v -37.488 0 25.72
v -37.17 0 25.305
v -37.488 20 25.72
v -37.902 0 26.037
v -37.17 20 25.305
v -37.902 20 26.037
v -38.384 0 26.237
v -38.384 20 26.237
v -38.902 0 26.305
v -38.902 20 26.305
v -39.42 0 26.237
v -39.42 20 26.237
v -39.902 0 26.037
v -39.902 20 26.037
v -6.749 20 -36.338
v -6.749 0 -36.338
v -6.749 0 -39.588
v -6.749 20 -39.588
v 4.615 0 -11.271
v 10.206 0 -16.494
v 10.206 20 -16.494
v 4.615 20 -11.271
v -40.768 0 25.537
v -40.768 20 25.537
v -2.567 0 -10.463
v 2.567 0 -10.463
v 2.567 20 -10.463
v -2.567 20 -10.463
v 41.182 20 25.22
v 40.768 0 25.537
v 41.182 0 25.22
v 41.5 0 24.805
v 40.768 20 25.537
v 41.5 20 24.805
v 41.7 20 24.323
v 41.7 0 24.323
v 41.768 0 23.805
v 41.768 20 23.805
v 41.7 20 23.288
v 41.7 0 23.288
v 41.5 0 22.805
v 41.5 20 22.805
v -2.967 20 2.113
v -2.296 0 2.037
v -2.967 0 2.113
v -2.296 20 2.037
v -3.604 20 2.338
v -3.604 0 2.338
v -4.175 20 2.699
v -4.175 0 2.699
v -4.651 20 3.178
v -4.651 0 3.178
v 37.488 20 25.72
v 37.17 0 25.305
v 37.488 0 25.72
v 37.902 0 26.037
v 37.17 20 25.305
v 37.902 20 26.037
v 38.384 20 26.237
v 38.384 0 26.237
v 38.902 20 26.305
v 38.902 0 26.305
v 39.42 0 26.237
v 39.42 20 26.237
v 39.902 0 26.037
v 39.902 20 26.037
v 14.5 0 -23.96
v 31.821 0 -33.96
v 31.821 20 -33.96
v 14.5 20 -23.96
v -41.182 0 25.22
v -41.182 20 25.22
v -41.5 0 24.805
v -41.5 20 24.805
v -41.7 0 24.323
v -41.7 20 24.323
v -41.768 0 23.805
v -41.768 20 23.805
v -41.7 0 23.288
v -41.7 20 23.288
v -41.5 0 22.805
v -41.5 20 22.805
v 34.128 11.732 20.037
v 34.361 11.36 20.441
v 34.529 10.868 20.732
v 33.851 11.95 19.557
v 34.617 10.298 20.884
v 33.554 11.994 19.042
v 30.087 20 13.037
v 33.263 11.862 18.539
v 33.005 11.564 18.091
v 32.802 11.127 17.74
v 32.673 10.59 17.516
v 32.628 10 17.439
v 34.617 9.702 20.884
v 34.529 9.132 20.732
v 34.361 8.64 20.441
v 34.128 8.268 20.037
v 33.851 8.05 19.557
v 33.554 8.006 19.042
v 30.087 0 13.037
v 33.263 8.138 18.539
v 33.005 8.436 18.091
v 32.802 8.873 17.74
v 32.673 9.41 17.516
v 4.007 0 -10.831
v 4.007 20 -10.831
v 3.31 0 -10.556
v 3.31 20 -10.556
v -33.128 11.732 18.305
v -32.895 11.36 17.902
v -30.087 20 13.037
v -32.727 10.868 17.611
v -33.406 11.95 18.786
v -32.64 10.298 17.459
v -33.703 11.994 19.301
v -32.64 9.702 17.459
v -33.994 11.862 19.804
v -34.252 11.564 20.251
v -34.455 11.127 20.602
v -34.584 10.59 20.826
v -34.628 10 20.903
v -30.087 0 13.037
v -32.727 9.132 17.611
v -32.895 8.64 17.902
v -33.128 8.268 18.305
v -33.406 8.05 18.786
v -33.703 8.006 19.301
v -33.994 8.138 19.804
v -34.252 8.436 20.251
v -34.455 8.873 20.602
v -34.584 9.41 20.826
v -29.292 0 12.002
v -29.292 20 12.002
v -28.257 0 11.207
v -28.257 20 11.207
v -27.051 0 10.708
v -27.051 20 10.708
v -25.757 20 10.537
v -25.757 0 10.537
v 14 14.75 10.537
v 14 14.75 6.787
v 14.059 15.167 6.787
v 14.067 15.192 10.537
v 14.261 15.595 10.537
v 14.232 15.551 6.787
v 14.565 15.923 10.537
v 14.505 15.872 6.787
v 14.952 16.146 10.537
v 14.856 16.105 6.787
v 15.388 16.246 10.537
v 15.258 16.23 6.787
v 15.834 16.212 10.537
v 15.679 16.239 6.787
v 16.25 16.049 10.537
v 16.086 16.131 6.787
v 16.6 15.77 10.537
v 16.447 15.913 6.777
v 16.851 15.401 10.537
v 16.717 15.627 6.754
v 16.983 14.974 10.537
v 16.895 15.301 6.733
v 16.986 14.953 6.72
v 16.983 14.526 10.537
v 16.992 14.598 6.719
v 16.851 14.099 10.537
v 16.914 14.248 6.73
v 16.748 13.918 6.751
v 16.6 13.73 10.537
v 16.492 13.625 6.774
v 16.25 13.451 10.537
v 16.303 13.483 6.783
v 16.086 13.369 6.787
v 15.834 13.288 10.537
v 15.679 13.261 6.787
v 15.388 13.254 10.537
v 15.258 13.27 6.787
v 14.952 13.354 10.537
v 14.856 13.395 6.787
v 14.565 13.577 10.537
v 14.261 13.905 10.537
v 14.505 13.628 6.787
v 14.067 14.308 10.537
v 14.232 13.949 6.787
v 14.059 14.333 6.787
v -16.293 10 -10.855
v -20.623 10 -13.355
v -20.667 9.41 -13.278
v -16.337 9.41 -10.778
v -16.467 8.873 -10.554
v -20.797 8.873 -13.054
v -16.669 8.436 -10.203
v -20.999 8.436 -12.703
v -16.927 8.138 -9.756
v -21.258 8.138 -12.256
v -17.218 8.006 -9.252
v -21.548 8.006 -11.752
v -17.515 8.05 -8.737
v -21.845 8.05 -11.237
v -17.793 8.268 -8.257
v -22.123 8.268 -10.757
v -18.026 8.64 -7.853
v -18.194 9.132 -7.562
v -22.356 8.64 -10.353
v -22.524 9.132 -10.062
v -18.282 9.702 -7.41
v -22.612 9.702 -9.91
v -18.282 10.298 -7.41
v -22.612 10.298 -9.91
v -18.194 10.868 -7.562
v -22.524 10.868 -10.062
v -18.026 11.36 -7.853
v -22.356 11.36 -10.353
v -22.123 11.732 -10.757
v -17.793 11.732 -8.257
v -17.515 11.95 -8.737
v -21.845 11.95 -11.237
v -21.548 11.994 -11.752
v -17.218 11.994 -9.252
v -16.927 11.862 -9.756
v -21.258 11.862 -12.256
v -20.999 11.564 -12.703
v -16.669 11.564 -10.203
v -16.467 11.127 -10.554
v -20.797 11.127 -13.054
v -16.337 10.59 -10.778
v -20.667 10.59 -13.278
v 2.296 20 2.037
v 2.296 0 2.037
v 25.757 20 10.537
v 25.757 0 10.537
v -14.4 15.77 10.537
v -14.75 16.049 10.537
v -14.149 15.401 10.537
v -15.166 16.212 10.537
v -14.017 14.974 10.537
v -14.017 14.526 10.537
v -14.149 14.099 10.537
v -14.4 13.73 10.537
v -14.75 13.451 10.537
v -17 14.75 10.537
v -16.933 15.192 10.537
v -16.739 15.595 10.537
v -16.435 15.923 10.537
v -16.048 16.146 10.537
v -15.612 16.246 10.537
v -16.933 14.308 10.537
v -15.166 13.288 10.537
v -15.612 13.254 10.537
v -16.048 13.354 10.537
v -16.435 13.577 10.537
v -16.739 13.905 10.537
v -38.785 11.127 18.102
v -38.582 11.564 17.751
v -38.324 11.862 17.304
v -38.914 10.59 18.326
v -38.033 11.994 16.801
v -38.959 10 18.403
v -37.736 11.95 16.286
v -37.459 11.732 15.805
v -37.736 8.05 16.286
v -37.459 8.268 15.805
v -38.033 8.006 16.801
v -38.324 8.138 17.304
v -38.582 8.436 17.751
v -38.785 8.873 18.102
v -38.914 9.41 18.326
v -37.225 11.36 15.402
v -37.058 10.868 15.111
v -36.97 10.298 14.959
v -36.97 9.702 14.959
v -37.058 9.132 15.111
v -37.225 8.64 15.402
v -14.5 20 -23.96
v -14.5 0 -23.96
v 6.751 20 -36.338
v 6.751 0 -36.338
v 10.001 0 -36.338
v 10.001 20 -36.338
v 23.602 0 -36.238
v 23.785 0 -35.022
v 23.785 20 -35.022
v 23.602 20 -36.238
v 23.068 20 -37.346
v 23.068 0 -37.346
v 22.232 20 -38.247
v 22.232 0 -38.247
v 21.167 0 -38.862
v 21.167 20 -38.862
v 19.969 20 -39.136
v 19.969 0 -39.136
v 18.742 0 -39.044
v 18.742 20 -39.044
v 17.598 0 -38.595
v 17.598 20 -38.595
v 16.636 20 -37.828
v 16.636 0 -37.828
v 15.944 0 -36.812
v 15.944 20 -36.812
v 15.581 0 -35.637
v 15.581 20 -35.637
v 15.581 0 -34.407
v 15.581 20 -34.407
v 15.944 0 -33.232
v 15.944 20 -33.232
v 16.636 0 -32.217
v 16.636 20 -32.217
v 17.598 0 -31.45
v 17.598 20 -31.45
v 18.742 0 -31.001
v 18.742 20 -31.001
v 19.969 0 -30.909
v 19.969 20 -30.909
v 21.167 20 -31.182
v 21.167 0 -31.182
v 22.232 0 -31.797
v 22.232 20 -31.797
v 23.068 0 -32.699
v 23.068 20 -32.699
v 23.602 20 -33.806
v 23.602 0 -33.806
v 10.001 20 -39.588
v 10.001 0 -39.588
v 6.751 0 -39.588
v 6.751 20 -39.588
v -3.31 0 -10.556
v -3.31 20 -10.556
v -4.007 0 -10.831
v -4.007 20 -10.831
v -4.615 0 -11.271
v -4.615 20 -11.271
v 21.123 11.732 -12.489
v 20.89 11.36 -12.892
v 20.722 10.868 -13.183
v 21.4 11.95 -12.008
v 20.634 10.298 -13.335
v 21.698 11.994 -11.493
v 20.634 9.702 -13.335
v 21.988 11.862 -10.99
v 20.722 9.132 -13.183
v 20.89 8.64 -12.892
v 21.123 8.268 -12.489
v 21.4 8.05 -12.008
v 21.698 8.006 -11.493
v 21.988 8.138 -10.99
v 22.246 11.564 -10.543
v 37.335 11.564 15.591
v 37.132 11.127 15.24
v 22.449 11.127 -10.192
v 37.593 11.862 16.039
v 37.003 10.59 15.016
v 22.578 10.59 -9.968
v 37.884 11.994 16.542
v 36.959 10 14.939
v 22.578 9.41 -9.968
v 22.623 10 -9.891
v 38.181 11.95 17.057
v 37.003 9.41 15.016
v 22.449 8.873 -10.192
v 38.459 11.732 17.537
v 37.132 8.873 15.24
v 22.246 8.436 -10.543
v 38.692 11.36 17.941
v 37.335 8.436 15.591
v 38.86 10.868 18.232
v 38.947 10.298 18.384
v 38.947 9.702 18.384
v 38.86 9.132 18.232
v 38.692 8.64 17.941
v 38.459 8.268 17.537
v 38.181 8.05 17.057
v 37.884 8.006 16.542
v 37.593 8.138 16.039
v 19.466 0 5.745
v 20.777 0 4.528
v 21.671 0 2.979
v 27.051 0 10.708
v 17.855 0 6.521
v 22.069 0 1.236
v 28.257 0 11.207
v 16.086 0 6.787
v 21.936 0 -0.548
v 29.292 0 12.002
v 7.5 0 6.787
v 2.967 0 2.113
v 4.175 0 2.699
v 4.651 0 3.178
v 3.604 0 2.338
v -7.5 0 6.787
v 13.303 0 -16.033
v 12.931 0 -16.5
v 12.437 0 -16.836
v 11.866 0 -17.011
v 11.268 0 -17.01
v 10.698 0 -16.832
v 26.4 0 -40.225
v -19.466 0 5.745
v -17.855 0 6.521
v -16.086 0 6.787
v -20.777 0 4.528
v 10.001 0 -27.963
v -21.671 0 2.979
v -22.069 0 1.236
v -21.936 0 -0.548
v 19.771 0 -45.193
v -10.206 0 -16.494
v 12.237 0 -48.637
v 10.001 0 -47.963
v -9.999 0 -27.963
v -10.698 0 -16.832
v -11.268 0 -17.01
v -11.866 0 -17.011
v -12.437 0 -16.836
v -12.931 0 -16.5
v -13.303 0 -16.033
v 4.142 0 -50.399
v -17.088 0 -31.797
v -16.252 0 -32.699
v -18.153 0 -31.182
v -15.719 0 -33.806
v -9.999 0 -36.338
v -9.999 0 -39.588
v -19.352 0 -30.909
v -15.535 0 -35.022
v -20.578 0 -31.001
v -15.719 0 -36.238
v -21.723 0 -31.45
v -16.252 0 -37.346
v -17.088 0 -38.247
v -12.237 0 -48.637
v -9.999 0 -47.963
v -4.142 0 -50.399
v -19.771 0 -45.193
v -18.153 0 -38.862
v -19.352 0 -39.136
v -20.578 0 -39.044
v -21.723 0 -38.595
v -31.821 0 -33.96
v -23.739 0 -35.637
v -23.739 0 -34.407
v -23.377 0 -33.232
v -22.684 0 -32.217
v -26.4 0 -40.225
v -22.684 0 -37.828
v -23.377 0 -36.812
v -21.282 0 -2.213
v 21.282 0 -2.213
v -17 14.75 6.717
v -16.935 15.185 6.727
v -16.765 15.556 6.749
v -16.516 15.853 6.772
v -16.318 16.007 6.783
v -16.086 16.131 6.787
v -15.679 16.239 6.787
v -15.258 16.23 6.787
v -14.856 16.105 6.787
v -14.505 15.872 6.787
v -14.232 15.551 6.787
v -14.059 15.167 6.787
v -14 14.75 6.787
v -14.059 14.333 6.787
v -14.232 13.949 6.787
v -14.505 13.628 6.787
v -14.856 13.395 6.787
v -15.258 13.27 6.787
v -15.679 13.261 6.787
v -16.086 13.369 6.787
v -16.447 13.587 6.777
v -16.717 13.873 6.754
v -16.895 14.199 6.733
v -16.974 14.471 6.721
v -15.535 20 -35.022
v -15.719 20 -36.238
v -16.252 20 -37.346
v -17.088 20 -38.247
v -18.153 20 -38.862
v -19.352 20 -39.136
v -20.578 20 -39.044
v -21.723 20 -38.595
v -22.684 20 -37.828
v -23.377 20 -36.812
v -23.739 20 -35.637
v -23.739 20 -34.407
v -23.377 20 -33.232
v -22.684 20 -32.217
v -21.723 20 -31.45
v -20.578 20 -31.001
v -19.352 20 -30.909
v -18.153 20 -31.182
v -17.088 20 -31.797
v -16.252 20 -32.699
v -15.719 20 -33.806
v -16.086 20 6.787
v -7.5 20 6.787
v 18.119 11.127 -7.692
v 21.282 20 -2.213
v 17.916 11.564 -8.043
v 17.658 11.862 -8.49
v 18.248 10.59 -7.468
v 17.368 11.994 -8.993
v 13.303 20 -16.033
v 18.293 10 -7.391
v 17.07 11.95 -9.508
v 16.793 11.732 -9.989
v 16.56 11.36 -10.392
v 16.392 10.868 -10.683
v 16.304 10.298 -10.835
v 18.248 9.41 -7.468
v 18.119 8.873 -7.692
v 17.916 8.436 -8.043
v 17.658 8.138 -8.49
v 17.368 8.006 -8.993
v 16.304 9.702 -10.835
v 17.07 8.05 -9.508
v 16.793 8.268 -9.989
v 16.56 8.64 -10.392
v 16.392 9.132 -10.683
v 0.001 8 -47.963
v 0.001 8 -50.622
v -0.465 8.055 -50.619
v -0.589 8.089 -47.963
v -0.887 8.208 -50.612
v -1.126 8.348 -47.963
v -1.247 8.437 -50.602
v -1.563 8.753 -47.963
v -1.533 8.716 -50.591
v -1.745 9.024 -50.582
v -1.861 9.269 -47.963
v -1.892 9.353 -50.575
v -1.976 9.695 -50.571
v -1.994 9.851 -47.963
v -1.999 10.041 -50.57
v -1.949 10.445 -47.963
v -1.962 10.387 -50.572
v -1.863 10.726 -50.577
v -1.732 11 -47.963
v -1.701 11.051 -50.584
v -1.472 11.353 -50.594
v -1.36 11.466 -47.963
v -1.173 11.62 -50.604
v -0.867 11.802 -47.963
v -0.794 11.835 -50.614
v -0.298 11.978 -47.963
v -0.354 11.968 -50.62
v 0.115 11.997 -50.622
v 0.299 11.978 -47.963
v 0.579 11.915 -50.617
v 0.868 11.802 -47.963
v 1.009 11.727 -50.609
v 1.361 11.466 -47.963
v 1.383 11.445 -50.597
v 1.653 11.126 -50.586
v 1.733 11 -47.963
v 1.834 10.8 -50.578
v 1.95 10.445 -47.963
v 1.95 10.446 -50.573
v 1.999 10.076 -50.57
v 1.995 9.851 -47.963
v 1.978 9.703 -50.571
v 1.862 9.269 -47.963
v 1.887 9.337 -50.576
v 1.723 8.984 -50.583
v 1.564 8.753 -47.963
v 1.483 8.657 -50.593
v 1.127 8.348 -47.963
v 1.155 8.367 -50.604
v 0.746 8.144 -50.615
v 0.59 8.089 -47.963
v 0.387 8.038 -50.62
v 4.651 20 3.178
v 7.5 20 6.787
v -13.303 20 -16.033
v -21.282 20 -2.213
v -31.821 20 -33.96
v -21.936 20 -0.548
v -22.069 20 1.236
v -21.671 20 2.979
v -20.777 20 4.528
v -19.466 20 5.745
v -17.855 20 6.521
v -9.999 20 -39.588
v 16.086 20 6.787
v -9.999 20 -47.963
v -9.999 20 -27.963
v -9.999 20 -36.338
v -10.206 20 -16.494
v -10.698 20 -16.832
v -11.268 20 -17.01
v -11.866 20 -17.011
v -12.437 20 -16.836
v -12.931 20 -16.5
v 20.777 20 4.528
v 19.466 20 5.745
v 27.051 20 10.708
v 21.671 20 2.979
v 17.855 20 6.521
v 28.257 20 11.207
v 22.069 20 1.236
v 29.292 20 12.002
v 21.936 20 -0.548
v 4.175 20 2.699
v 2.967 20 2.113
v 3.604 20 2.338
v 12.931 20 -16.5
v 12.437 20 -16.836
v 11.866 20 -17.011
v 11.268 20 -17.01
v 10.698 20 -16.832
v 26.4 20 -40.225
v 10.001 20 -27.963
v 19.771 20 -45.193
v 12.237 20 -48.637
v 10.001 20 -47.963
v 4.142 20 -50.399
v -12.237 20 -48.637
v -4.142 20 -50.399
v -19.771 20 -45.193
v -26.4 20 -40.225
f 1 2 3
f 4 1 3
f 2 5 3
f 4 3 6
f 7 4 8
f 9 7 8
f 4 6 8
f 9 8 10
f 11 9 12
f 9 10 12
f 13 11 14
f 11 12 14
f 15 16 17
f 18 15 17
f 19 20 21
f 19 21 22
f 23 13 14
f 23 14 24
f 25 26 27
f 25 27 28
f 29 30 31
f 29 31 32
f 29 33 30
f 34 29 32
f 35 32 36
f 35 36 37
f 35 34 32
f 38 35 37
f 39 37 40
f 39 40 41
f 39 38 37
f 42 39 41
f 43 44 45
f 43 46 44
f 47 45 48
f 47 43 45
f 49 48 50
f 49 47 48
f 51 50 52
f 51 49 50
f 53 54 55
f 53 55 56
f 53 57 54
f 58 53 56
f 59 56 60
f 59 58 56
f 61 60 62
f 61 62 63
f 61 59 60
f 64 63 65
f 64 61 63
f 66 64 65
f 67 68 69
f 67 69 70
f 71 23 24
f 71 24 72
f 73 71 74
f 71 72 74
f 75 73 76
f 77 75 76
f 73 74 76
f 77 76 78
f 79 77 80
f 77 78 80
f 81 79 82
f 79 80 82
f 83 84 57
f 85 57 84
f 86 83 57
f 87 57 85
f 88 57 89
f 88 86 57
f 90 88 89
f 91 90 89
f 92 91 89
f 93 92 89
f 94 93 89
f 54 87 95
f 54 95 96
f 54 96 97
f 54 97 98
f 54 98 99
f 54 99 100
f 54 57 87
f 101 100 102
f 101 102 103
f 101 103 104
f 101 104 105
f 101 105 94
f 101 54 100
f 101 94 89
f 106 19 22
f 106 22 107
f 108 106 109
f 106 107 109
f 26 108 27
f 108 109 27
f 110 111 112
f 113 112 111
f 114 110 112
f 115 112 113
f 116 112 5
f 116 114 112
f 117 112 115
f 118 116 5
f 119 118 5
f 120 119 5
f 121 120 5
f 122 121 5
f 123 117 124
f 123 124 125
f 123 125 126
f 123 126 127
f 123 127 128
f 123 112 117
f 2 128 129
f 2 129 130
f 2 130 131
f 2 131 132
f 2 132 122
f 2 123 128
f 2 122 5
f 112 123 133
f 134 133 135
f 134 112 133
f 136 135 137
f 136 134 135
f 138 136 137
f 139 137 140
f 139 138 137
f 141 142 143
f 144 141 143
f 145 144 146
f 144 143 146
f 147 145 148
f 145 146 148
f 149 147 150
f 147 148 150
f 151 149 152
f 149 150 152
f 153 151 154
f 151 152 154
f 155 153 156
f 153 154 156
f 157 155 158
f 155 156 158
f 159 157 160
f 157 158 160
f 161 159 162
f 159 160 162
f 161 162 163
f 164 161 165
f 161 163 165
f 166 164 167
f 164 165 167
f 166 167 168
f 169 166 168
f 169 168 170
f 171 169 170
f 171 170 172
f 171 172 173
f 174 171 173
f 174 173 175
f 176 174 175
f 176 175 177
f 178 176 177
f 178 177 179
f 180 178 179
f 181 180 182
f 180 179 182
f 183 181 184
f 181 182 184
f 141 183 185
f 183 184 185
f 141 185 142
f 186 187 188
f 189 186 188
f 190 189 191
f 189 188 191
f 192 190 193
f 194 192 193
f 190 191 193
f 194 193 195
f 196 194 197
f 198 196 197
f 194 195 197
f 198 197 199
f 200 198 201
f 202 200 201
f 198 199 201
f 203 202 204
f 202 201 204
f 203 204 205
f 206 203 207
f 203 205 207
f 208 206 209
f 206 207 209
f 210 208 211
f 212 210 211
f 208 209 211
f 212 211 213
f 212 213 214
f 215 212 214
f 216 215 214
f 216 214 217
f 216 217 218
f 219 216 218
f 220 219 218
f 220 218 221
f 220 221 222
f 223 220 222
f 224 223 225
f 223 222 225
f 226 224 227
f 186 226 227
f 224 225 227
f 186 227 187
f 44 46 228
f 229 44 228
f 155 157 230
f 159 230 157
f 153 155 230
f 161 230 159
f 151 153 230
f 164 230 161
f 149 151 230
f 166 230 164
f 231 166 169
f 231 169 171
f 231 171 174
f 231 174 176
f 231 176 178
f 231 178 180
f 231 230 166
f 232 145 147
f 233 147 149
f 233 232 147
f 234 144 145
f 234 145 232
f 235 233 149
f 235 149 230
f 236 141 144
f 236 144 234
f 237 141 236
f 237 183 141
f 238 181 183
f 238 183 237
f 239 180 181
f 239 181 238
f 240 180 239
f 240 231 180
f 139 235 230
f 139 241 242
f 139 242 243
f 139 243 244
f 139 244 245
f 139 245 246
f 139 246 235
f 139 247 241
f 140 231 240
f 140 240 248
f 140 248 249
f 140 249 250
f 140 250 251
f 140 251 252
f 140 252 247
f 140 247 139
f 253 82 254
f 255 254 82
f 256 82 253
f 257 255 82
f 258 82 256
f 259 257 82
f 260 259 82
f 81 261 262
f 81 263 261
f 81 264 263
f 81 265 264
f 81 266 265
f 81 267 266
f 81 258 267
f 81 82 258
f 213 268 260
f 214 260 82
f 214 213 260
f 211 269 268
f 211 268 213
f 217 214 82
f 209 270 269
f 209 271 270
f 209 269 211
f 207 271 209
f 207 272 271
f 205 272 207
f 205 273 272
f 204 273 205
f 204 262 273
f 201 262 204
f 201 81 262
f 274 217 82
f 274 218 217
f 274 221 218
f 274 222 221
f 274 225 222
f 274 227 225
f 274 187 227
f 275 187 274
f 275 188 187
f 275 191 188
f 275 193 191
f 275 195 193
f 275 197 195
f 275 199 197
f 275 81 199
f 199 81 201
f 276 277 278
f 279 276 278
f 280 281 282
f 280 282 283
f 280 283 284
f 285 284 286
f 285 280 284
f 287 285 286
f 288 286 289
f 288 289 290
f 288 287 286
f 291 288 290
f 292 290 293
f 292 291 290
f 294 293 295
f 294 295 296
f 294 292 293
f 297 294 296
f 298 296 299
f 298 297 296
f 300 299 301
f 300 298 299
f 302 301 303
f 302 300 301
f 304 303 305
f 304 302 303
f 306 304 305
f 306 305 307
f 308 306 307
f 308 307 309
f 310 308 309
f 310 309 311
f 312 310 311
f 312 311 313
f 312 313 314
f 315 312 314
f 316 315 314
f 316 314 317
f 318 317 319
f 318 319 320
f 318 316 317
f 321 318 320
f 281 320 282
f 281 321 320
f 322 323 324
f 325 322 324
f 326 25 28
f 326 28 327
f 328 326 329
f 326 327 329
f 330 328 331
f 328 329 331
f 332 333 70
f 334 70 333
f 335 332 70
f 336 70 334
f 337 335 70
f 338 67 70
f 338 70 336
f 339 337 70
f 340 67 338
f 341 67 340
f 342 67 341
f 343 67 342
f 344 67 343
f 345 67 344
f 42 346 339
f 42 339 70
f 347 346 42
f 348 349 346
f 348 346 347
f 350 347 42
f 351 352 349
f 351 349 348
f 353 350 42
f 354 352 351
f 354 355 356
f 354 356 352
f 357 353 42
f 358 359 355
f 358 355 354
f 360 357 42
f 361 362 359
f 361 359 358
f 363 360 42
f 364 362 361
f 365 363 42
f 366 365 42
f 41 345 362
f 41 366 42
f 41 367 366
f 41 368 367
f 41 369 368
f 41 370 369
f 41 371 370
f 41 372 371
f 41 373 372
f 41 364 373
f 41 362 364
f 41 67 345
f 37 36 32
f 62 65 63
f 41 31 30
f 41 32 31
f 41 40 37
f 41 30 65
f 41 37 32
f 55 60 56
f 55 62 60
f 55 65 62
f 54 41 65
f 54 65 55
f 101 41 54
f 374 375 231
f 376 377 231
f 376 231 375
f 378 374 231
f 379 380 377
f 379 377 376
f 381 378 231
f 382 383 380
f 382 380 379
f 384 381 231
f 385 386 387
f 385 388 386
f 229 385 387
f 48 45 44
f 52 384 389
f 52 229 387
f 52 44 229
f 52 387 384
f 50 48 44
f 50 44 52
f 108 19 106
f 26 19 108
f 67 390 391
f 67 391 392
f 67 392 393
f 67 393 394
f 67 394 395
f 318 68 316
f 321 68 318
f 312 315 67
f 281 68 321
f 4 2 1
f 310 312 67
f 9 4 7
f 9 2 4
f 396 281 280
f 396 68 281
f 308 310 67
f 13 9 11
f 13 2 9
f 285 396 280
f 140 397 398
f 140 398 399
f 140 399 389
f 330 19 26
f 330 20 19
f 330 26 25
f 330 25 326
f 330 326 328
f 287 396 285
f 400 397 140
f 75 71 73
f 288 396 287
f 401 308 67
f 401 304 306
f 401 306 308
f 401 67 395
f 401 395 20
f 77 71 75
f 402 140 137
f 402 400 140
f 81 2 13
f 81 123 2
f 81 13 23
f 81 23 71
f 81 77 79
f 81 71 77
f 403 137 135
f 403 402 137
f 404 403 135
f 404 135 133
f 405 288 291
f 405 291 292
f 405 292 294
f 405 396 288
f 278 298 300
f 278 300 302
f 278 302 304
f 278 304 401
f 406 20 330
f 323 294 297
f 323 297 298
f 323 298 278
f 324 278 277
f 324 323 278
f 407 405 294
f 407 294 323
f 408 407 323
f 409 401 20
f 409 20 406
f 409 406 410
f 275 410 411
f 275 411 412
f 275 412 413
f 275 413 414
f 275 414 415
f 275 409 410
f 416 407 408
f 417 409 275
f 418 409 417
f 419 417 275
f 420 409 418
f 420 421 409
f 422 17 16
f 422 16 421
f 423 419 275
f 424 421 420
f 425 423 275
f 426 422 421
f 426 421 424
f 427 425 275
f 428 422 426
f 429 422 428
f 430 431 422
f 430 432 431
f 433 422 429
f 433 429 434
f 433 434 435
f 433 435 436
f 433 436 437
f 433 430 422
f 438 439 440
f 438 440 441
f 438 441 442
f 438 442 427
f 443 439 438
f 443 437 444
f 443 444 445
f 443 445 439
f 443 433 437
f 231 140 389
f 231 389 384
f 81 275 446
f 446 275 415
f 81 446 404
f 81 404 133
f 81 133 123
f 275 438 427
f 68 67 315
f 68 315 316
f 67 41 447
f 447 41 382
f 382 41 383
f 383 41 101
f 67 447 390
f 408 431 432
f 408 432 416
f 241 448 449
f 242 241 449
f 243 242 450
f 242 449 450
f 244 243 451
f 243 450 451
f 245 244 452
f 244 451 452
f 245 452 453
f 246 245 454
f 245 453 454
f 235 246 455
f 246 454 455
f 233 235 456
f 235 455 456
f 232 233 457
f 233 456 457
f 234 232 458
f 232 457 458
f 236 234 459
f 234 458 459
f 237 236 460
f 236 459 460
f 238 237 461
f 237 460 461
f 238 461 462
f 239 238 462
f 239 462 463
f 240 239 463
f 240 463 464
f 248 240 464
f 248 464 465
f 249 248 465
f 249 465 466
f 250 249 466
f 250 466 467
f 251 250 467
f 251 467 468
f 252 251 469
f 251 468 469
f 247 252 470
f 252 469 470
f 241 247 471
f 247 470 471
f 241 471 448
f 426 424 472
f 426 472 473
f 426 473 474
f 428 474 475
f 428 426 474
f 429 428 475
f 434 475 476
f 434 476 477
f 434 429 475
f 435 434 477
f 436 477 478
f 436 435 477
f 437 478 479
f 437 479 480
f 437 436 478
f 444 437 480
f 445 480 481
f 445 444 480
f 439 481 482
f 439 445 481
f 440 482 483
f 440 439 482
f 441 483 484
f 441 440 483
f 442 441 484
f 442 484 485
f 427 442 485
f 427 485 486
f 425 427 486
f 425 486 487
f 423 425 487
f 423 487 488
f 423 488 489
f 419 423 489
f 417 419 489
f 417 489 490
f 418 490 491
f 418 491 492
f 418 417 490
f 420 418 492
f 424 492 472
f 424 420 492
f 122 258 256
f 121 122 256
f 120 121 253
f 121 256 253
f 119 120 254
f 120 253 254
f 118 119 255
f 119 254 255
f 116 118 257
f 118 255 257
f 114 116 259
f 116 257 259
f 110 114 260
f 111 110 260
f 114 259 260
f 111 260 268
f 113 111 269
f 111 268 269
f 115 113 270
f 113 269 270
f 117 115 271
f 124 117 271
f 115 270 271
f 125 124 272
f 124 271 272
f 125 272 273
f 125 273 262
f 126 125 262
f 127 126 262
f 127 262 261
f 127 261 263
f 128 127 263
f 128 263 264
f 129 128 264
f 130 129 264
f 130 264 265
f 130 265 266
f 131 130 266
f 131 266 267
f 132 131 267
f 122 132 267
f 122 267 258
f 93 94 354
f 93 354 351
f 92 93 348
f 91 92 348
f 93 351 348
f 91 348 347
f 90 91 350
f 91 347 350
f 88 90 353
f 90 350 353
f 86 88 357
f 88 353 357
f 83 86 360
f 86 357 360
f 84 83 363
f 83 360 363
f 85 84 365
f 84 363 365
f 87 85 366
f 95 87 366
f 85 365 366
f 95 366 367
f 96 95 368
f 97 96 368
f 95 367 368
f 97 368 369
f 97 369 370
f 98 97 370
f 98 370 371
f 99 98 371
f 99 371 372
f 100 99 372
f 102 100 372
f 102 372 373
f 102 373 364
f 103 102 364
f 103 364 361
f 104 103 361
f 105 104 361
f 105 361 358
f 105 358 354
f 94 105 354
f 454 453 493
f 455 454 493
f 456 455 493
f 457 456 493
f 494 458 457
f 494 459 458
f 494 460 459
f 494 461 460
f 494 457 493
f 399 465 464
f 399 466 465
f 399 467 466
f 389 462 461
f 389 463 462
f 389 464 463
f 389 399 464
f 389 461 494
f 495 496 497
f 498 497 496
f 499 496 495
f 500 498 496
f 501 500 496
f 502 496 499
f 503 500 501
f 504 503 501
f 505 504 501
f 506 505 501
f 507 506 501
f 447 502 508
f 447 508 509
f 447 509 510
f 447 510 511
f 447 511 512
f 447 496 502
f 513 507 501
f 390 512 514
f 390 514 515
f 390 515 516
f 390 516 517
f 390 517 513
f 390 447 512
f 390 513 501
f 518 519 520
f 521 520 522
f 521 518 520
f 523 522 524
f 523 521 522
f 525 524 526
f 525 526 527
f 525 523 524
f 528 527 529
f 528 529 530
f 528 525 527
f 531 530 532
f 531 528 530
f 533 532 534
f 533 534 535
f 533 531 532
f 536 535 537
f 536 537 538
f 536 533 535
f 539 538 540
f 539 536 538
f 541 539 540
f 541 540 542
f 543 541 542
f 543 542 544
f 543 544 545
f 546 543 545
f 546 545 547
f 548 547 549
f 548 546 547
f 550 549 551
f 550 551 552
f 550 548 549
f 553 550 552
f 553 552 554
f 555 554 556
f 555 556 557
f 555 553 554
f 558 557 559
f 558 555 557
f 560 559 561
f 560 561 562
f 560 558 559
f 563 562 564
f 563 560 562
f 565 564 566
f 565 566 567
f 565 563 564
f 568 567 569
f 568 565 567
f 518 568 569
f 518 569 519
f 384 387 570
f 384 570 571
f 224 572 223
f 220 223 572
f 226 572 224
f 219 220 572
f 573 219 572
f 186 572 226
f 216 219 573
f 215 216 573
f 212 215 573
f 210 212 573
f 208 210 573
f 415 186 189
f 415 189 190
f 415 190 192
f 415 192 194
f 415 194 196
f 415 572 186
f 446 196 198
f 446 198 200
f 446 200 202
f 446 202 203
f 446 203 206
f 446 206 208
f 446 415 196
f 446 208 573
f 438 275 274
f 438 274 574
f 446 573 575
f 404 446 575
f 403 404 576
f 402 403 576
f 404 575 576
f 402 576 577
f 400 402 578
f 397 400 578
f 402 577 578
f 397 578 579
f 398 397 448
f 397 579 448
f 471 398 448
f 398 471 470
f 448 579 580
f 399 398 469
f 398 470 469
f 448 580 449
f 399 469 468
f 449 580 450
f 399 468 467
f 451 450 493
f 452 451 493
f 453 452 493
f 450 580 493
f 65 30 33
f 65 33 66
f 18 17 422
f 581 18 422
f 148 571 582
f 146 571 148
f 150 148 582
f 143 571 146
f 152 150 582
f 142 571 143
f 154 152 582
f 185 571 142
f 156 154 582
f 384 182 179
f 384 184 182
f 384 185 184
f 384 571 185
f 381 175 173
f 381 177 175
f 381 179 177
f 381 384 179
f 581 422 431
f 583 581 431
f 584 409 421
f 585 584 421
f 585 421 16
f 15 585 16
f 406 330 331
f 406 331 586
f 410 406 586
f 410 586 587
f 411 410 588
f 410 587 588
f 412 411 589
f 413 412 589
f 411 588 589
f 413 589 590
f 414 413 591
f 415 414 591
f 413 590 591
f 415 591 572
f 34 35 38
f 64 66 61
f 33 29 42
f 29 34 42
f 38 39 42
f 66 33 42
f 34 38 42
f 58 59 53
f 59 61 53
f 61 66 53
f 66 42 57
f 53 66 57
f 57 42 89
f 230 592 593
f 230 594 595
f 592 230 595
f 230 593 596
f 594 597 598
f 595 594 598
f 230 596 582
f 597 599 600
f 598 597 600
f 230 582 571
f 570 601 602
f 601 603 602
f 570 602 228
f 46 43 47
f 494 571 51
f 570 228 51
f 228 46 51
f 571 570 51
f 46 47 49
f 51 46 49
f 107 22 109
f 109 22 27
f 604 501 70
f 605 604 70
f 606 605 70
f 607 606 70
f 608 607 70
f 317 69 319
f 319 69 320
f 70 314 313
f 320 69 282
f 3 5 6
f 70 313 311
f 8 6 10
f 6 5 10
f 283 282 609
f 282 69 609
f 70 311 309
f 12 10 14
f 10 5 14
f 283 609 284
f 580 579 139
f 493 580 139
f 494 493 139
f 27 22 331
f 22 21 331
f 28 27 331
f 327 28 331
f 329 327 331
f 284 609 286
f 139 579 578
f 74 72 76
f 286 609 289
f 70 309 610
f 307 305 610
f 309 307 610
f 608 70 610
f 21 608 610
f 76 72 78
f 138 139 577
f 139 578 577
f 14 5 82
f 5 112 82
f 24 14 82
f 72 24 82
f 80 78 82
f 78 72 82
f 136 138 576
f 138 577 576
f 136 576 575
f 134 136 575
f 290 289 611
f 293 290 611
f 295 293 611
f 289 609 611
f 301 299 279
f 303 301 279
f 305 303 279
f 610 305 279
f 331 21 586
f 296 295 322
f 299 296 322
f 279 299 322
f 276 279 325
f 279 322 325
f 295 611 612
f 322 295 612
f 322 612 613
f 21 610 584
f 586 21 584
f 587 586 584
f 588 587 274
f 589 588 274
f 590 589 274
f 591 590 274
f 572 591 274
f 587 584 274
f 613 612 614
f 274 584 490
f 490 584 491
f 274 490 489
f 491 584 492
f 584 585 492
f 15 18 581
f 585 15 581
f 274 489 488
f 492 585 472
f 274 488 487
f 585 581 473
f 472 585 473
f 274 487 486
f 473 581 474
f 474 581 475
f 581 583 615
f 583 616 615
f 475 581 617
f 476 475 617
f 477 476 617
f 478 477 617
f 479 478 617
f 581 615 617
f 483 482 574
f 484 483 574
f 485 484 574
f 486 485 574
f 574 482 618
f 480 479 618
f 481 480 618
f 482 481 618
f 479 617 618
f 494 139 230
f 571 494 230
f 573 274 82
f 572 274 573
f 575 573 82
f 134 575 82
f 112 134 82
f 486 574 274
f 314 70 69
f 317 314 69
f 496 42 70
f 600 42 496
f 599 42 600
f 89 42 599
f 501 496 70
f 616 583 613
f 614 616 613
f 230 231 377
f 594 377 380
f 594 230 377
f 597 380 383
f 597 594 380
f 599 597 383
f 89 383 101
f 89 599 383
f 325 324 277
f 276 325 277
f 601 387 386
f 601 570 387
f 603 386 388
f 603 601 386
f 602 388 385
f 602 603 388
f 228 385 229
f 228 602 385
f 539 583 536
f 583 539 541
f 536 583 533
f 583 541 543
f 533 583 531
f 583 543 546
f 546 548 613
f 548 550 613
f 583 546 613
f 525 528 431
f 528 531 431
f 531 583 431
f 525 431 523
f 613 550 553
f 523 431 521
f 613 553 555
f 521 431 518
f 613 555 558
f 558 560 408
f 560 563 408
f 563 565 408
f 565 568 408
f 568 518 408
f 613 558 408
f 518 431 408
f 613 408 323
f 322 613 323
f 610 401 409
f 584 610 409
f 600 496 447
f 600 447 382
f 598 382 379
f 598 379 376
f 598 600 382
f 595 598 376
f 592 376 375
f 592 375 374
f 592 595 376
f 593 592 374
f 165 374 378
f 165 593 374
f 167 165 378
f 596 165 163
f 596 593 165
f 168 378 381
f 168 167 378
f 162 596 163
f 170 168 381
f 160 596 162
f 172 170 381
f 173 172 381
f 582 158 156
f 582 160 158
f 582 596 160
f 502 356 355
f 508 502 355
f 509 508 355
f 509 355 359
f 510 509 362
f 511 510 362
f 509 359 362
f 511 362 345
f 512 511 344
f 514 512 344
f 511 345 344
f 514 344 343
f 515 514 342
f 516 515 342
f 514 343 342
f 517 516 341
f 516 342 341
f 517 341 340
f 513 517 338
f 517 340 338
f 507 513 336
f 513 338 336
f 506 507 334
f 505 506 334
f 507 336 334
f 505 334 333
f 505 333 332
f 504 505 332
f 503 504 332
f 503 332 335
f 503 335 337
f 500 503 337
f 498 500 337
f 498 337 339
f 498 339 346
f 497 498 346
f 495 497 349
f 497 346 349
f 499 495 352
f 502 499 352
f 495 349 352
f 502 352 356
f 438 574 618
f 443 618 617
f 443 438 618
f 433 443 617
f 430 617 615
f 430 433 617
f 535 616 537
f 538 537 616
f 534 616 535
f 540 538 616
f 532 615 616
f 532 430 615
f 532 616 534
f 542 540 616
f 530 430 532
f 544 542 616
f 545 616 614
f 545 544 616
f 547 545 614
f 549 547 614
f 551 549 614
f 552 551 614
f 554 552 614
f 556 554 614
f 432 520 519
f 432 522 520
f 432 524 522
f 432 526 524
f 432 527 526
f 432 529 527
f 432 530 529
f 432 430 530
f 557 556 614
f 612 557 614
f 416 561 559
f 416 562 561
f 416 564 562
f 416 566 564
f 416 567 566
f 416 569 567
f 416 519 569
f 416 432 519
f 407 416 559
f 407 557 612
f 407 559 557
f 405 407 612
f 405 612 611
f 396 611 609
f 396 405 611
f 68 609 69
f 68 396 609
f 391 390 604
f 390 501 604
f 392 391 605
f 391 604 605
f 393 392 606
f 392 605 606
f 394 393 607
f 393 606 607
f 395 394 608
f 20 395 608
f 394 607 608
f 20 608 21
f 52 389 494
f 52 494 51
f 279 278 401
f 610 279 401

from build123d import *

# Parameters (mm, degrees)
SKETCH1_R                      = 4.125
BOSS_EXTRUDE1_DEPTH            = 20
FILLET2_R                      = 5
FILLET3_R                      = 5
FILLET4_R                      = 6
FILLET5_R                      = 6
FILLET6_R                      = 2
FILLET7_R                      = 3
FILLET10_R                     = 2
F_8_0_199_DIAMETER_HOLE2_D     = 4
F_8_0_199_DIAMETER_HOLE3_D     = 4
SKETCH12_W                     = 2
SKETCH12_H                     = 41.945563192
SKETCH16_W                     = 2
SKETCH16_H                     = 41.945563192
F_8_0_199_DIAMETER_HOLE8_D     = 3.000000096
F_8_0_199_DIAMETER_HOLE8_DEPTH = 4
F_8_0_199_DIAMETER_HOLE8_TIP   = 0.901290957


with BuildPart() as part:
    # Sketch1 → Boss-Extrude1 (new body)
    with BuildSketch(Plane(origin=(0, 0, 0), x_dir=(1, 0, 0), z_dir=(0, 1, 0))):
        with BuildLine():
            Line((-28.643593539, -10.537386441), (-38.169872981, -27.037386441))
            Line((-38.169872981, -27.037386441), (-42.5, -24.537386441))
            Line((-42.5, -24.537386441), (-14.5, 23.960036171))
            Line((-14.5, 23.960036171), (-31.820508076, 33.960036171))
            ThreePointArc((-31.820508076, 33.960036171), (0, 50.621689136), (31.820508076, 33.960036171))
            Line((31.820508076, 33.960036171), (14.5, 23.960036171))
            Line((14.5, 23.960036171), (42.5, -24.537386441))
            Line((42.5, -24.537386441), (38.169872981, -27.037386441))
            Line((38.169872981, -27.037386441), (28.643593539, -10.537386441))
            Line((28.643593539, -10.537386441), (-28.643593539, -10.537386441))
        make_face()
        with Locations((19.660254038, 35.022213998)):
            Circle(SKETCH1_R, mode=Mode.SUBTRACT)
        with Locations((-19.660254038, 35.022213998)):
            Circle(SKETCH1_R, mode=Mode.SUBTRACT)
        Polygon((-12.0447733, 18.212613559), (-26.47853003, -6.787386441), (-7.5, -6.787386441), (-3.75, -2.037386441), (3.75, -2.037386441), (7.5, -6.787386441), (26.47853003, -6.787386441), (12.0447733, 18.212613559), (3.75, 10.462613559), (-3.75, 10.462613559), align=None, mode=Mode.SUBTRACT)
        Polygon((-9.999491924, 47.962613559), (10.000508076, 47.962613559), (10.000508076, 39.587613559), (6.750508076, 39.587613559), (6.750508076, 36.337613559), (10.000508076, 36.337613559), (10.000508076, 27.962613559), (-9.999491924, 27.962613559), (-9.999491924, 36.337613559), (-6.749491924, 36.337613559), (-6.749491924, 39.587613559), (-9.999491924, 39.587613559), align=None, mode=Mode.SUBTRACT)
    extrude(amount=BOSS_EXTRUDE1_DEPTH)

    # Fillet2
    fillet2_edges = [part.edges().sort_by_distance(p)[0] for p in [
        (-28.643593539, 10, 10.537386441),
    ]]
    fillet(fillet2_edges, radius=FILLET2_R)

    # Fillet3
    fillet3_edges = [part.edges().sort_by_distance(p)[0] for p in [
        (28.643593539, 10, 10.537386441),
    ]]
    fillet(fillet3_edges, radius=FILLET3_R)

    # Fillet4
    fillet4_edges = [part.edges().sort_by_distance(p)[0] for p in [
        (-26.47853003, 10, 6.787386441),
    ]]
    fillet(fillet4_edges, radius=FILLET4_R)

    # Fillet5
    fillet5_edges = [part.edges().sort_by_distance(p)[0] for p in [
        (26.47853003, 10, 6.787386441),
    ]]
    fillet(fillet5_edges, radius=FILLET5_R)

    # Fillet6
    fillet6_edges = [part.edges().sort_by_distance(p)[0] for p in [
        (-12.0447733, 10, -18.212613559),
        (12.0447733, 10, -18.212613559),
    ]]
    fillet(fillet6_edges, radius=FILLET6_R)

    # Fillet7
    fillet7_edges = [part.edges().sort_by_distance(p)[0] for p in [
        (-3.75, 10, -10.462613559),
        (-3.75, 10, 2.037386441),
        (3.75, 10, 2.037386441),
        (3.75, 10, -10.462613559),
    ]]
    fillet(fillet7_edges, radius=FILLET7_R)

    # Fillet10
    fillet10_edges = [part.edges().sort_by_distance(p)[0] for p in [
        (-38.169872981, 10, 27.037386441),
        (-42.5, 10, 24.537386441),
        (42.5, 10, 24.537386441),
        (38.169872981, 10, 27.037386441),
    ]]
    fillet(fillet10_edges, radius=FILLET10_R)

    # #8 (0.199) Diameter Hole2 (through all)
    with Locations(Plane(origin=(16.919872981, 0, -9.76869322), x_dir=(0.5, 0, 0.866025404), z_dir=(-0.866025404, 0, 0.5))):
        with Locations((33.417096231, 10)):
            Hole(F_8_0_199_DIAMETER_HOLE2_D / 2)

    # #8 (0.199) Diameter Hole3 (through all)
    with Locations(Plane(origin=(-16.919872981, 0, -9.76869322), x_dir=(0.5, 0, -0.866025404), z_dir=(0.866025404, 0, 0.5))):
        with Locations((-33.417096231, 10)):
            Hole(F_8_0_199_DIAMETER_HOLE3_D / 2)

    # Sketch12 → #8 (0.199) Diameter Hole5 (revolve, cut)
    with BuildSketch(Plane(origin=(17.292785365, 10, -9.122790024), x_dir=(0.5, 0, 0.866025404), z_dir=(0, 1, 0))):
        with Locations((1, 20.972781596)):
            Rectangle(SKETCH12_W, SKETCH12_H)
    revolve(axis=Axis((11.793524051, 10, -5.947790024), (0.866025404, 0, -0.5)), mode=Mode.SUBTRACT)

    # Sketch16 → #8 (0.199) Diameter Hole6 (revolve, cut)
    with BuildSketch(Plane(origin=(-17.292785365, 10, -9.122790024), x_dir=(0.5, 0, -0.866025404), z_dir=(0, 1, 0))):
        with Locations((1, 20.972781596)):
            Rectangle(SKETCH16_W, SKETCH16_H)
    revolve(axis=Axis((-11.793524051, 10, -5.947790024), (-0.866025404, 0, -0.5)), mode=Mode.SUBTRACT)

    # Sketch18 → #8 (0.199) Diameter Hole7 (revolve, cut)
    with BuildSketch(Plane(origin=(0.000508076, 10, -47.962613559), x_dir=(0, -1, 0), z_dir=(1, 0, 0))):
        Polygon((0, 0), (0, 31.2017212), (1.999999937, 30), (1.999999937, 0), align=None)
    revolve(axis=Axis((0.000508076, 10, -41.612613559), (0, 0, -1)), mode=Mode.SUBTRACT)

    # #8 (0.199) Diameter Hole8
    with Locations(Plane.XY.offset(10.537386441)):
        with Locations((-15.499957804, 14.75), (15.500042196, 14.75)):
            Hole(F_8_0_199_DIAMETER_HOLE8_D / 2, depth=F_8_0_199_DIAMETER_HOLE8_DEPTH)
            with Locations((0, 0, -(F_8_0_199_DIAMETER_HOLE8_DEPTH + F_8_0_199_DIAMETER_HOLE8_TIP / 2))):  # 118° drill point
                Cone(0, F_8_0_199_DIAMETER_HOLE8_D / 2, F_8_0_199_DIAMETER_HOLE8_TIP, mode=Mode.SUBTRACT)


solid = part.part
